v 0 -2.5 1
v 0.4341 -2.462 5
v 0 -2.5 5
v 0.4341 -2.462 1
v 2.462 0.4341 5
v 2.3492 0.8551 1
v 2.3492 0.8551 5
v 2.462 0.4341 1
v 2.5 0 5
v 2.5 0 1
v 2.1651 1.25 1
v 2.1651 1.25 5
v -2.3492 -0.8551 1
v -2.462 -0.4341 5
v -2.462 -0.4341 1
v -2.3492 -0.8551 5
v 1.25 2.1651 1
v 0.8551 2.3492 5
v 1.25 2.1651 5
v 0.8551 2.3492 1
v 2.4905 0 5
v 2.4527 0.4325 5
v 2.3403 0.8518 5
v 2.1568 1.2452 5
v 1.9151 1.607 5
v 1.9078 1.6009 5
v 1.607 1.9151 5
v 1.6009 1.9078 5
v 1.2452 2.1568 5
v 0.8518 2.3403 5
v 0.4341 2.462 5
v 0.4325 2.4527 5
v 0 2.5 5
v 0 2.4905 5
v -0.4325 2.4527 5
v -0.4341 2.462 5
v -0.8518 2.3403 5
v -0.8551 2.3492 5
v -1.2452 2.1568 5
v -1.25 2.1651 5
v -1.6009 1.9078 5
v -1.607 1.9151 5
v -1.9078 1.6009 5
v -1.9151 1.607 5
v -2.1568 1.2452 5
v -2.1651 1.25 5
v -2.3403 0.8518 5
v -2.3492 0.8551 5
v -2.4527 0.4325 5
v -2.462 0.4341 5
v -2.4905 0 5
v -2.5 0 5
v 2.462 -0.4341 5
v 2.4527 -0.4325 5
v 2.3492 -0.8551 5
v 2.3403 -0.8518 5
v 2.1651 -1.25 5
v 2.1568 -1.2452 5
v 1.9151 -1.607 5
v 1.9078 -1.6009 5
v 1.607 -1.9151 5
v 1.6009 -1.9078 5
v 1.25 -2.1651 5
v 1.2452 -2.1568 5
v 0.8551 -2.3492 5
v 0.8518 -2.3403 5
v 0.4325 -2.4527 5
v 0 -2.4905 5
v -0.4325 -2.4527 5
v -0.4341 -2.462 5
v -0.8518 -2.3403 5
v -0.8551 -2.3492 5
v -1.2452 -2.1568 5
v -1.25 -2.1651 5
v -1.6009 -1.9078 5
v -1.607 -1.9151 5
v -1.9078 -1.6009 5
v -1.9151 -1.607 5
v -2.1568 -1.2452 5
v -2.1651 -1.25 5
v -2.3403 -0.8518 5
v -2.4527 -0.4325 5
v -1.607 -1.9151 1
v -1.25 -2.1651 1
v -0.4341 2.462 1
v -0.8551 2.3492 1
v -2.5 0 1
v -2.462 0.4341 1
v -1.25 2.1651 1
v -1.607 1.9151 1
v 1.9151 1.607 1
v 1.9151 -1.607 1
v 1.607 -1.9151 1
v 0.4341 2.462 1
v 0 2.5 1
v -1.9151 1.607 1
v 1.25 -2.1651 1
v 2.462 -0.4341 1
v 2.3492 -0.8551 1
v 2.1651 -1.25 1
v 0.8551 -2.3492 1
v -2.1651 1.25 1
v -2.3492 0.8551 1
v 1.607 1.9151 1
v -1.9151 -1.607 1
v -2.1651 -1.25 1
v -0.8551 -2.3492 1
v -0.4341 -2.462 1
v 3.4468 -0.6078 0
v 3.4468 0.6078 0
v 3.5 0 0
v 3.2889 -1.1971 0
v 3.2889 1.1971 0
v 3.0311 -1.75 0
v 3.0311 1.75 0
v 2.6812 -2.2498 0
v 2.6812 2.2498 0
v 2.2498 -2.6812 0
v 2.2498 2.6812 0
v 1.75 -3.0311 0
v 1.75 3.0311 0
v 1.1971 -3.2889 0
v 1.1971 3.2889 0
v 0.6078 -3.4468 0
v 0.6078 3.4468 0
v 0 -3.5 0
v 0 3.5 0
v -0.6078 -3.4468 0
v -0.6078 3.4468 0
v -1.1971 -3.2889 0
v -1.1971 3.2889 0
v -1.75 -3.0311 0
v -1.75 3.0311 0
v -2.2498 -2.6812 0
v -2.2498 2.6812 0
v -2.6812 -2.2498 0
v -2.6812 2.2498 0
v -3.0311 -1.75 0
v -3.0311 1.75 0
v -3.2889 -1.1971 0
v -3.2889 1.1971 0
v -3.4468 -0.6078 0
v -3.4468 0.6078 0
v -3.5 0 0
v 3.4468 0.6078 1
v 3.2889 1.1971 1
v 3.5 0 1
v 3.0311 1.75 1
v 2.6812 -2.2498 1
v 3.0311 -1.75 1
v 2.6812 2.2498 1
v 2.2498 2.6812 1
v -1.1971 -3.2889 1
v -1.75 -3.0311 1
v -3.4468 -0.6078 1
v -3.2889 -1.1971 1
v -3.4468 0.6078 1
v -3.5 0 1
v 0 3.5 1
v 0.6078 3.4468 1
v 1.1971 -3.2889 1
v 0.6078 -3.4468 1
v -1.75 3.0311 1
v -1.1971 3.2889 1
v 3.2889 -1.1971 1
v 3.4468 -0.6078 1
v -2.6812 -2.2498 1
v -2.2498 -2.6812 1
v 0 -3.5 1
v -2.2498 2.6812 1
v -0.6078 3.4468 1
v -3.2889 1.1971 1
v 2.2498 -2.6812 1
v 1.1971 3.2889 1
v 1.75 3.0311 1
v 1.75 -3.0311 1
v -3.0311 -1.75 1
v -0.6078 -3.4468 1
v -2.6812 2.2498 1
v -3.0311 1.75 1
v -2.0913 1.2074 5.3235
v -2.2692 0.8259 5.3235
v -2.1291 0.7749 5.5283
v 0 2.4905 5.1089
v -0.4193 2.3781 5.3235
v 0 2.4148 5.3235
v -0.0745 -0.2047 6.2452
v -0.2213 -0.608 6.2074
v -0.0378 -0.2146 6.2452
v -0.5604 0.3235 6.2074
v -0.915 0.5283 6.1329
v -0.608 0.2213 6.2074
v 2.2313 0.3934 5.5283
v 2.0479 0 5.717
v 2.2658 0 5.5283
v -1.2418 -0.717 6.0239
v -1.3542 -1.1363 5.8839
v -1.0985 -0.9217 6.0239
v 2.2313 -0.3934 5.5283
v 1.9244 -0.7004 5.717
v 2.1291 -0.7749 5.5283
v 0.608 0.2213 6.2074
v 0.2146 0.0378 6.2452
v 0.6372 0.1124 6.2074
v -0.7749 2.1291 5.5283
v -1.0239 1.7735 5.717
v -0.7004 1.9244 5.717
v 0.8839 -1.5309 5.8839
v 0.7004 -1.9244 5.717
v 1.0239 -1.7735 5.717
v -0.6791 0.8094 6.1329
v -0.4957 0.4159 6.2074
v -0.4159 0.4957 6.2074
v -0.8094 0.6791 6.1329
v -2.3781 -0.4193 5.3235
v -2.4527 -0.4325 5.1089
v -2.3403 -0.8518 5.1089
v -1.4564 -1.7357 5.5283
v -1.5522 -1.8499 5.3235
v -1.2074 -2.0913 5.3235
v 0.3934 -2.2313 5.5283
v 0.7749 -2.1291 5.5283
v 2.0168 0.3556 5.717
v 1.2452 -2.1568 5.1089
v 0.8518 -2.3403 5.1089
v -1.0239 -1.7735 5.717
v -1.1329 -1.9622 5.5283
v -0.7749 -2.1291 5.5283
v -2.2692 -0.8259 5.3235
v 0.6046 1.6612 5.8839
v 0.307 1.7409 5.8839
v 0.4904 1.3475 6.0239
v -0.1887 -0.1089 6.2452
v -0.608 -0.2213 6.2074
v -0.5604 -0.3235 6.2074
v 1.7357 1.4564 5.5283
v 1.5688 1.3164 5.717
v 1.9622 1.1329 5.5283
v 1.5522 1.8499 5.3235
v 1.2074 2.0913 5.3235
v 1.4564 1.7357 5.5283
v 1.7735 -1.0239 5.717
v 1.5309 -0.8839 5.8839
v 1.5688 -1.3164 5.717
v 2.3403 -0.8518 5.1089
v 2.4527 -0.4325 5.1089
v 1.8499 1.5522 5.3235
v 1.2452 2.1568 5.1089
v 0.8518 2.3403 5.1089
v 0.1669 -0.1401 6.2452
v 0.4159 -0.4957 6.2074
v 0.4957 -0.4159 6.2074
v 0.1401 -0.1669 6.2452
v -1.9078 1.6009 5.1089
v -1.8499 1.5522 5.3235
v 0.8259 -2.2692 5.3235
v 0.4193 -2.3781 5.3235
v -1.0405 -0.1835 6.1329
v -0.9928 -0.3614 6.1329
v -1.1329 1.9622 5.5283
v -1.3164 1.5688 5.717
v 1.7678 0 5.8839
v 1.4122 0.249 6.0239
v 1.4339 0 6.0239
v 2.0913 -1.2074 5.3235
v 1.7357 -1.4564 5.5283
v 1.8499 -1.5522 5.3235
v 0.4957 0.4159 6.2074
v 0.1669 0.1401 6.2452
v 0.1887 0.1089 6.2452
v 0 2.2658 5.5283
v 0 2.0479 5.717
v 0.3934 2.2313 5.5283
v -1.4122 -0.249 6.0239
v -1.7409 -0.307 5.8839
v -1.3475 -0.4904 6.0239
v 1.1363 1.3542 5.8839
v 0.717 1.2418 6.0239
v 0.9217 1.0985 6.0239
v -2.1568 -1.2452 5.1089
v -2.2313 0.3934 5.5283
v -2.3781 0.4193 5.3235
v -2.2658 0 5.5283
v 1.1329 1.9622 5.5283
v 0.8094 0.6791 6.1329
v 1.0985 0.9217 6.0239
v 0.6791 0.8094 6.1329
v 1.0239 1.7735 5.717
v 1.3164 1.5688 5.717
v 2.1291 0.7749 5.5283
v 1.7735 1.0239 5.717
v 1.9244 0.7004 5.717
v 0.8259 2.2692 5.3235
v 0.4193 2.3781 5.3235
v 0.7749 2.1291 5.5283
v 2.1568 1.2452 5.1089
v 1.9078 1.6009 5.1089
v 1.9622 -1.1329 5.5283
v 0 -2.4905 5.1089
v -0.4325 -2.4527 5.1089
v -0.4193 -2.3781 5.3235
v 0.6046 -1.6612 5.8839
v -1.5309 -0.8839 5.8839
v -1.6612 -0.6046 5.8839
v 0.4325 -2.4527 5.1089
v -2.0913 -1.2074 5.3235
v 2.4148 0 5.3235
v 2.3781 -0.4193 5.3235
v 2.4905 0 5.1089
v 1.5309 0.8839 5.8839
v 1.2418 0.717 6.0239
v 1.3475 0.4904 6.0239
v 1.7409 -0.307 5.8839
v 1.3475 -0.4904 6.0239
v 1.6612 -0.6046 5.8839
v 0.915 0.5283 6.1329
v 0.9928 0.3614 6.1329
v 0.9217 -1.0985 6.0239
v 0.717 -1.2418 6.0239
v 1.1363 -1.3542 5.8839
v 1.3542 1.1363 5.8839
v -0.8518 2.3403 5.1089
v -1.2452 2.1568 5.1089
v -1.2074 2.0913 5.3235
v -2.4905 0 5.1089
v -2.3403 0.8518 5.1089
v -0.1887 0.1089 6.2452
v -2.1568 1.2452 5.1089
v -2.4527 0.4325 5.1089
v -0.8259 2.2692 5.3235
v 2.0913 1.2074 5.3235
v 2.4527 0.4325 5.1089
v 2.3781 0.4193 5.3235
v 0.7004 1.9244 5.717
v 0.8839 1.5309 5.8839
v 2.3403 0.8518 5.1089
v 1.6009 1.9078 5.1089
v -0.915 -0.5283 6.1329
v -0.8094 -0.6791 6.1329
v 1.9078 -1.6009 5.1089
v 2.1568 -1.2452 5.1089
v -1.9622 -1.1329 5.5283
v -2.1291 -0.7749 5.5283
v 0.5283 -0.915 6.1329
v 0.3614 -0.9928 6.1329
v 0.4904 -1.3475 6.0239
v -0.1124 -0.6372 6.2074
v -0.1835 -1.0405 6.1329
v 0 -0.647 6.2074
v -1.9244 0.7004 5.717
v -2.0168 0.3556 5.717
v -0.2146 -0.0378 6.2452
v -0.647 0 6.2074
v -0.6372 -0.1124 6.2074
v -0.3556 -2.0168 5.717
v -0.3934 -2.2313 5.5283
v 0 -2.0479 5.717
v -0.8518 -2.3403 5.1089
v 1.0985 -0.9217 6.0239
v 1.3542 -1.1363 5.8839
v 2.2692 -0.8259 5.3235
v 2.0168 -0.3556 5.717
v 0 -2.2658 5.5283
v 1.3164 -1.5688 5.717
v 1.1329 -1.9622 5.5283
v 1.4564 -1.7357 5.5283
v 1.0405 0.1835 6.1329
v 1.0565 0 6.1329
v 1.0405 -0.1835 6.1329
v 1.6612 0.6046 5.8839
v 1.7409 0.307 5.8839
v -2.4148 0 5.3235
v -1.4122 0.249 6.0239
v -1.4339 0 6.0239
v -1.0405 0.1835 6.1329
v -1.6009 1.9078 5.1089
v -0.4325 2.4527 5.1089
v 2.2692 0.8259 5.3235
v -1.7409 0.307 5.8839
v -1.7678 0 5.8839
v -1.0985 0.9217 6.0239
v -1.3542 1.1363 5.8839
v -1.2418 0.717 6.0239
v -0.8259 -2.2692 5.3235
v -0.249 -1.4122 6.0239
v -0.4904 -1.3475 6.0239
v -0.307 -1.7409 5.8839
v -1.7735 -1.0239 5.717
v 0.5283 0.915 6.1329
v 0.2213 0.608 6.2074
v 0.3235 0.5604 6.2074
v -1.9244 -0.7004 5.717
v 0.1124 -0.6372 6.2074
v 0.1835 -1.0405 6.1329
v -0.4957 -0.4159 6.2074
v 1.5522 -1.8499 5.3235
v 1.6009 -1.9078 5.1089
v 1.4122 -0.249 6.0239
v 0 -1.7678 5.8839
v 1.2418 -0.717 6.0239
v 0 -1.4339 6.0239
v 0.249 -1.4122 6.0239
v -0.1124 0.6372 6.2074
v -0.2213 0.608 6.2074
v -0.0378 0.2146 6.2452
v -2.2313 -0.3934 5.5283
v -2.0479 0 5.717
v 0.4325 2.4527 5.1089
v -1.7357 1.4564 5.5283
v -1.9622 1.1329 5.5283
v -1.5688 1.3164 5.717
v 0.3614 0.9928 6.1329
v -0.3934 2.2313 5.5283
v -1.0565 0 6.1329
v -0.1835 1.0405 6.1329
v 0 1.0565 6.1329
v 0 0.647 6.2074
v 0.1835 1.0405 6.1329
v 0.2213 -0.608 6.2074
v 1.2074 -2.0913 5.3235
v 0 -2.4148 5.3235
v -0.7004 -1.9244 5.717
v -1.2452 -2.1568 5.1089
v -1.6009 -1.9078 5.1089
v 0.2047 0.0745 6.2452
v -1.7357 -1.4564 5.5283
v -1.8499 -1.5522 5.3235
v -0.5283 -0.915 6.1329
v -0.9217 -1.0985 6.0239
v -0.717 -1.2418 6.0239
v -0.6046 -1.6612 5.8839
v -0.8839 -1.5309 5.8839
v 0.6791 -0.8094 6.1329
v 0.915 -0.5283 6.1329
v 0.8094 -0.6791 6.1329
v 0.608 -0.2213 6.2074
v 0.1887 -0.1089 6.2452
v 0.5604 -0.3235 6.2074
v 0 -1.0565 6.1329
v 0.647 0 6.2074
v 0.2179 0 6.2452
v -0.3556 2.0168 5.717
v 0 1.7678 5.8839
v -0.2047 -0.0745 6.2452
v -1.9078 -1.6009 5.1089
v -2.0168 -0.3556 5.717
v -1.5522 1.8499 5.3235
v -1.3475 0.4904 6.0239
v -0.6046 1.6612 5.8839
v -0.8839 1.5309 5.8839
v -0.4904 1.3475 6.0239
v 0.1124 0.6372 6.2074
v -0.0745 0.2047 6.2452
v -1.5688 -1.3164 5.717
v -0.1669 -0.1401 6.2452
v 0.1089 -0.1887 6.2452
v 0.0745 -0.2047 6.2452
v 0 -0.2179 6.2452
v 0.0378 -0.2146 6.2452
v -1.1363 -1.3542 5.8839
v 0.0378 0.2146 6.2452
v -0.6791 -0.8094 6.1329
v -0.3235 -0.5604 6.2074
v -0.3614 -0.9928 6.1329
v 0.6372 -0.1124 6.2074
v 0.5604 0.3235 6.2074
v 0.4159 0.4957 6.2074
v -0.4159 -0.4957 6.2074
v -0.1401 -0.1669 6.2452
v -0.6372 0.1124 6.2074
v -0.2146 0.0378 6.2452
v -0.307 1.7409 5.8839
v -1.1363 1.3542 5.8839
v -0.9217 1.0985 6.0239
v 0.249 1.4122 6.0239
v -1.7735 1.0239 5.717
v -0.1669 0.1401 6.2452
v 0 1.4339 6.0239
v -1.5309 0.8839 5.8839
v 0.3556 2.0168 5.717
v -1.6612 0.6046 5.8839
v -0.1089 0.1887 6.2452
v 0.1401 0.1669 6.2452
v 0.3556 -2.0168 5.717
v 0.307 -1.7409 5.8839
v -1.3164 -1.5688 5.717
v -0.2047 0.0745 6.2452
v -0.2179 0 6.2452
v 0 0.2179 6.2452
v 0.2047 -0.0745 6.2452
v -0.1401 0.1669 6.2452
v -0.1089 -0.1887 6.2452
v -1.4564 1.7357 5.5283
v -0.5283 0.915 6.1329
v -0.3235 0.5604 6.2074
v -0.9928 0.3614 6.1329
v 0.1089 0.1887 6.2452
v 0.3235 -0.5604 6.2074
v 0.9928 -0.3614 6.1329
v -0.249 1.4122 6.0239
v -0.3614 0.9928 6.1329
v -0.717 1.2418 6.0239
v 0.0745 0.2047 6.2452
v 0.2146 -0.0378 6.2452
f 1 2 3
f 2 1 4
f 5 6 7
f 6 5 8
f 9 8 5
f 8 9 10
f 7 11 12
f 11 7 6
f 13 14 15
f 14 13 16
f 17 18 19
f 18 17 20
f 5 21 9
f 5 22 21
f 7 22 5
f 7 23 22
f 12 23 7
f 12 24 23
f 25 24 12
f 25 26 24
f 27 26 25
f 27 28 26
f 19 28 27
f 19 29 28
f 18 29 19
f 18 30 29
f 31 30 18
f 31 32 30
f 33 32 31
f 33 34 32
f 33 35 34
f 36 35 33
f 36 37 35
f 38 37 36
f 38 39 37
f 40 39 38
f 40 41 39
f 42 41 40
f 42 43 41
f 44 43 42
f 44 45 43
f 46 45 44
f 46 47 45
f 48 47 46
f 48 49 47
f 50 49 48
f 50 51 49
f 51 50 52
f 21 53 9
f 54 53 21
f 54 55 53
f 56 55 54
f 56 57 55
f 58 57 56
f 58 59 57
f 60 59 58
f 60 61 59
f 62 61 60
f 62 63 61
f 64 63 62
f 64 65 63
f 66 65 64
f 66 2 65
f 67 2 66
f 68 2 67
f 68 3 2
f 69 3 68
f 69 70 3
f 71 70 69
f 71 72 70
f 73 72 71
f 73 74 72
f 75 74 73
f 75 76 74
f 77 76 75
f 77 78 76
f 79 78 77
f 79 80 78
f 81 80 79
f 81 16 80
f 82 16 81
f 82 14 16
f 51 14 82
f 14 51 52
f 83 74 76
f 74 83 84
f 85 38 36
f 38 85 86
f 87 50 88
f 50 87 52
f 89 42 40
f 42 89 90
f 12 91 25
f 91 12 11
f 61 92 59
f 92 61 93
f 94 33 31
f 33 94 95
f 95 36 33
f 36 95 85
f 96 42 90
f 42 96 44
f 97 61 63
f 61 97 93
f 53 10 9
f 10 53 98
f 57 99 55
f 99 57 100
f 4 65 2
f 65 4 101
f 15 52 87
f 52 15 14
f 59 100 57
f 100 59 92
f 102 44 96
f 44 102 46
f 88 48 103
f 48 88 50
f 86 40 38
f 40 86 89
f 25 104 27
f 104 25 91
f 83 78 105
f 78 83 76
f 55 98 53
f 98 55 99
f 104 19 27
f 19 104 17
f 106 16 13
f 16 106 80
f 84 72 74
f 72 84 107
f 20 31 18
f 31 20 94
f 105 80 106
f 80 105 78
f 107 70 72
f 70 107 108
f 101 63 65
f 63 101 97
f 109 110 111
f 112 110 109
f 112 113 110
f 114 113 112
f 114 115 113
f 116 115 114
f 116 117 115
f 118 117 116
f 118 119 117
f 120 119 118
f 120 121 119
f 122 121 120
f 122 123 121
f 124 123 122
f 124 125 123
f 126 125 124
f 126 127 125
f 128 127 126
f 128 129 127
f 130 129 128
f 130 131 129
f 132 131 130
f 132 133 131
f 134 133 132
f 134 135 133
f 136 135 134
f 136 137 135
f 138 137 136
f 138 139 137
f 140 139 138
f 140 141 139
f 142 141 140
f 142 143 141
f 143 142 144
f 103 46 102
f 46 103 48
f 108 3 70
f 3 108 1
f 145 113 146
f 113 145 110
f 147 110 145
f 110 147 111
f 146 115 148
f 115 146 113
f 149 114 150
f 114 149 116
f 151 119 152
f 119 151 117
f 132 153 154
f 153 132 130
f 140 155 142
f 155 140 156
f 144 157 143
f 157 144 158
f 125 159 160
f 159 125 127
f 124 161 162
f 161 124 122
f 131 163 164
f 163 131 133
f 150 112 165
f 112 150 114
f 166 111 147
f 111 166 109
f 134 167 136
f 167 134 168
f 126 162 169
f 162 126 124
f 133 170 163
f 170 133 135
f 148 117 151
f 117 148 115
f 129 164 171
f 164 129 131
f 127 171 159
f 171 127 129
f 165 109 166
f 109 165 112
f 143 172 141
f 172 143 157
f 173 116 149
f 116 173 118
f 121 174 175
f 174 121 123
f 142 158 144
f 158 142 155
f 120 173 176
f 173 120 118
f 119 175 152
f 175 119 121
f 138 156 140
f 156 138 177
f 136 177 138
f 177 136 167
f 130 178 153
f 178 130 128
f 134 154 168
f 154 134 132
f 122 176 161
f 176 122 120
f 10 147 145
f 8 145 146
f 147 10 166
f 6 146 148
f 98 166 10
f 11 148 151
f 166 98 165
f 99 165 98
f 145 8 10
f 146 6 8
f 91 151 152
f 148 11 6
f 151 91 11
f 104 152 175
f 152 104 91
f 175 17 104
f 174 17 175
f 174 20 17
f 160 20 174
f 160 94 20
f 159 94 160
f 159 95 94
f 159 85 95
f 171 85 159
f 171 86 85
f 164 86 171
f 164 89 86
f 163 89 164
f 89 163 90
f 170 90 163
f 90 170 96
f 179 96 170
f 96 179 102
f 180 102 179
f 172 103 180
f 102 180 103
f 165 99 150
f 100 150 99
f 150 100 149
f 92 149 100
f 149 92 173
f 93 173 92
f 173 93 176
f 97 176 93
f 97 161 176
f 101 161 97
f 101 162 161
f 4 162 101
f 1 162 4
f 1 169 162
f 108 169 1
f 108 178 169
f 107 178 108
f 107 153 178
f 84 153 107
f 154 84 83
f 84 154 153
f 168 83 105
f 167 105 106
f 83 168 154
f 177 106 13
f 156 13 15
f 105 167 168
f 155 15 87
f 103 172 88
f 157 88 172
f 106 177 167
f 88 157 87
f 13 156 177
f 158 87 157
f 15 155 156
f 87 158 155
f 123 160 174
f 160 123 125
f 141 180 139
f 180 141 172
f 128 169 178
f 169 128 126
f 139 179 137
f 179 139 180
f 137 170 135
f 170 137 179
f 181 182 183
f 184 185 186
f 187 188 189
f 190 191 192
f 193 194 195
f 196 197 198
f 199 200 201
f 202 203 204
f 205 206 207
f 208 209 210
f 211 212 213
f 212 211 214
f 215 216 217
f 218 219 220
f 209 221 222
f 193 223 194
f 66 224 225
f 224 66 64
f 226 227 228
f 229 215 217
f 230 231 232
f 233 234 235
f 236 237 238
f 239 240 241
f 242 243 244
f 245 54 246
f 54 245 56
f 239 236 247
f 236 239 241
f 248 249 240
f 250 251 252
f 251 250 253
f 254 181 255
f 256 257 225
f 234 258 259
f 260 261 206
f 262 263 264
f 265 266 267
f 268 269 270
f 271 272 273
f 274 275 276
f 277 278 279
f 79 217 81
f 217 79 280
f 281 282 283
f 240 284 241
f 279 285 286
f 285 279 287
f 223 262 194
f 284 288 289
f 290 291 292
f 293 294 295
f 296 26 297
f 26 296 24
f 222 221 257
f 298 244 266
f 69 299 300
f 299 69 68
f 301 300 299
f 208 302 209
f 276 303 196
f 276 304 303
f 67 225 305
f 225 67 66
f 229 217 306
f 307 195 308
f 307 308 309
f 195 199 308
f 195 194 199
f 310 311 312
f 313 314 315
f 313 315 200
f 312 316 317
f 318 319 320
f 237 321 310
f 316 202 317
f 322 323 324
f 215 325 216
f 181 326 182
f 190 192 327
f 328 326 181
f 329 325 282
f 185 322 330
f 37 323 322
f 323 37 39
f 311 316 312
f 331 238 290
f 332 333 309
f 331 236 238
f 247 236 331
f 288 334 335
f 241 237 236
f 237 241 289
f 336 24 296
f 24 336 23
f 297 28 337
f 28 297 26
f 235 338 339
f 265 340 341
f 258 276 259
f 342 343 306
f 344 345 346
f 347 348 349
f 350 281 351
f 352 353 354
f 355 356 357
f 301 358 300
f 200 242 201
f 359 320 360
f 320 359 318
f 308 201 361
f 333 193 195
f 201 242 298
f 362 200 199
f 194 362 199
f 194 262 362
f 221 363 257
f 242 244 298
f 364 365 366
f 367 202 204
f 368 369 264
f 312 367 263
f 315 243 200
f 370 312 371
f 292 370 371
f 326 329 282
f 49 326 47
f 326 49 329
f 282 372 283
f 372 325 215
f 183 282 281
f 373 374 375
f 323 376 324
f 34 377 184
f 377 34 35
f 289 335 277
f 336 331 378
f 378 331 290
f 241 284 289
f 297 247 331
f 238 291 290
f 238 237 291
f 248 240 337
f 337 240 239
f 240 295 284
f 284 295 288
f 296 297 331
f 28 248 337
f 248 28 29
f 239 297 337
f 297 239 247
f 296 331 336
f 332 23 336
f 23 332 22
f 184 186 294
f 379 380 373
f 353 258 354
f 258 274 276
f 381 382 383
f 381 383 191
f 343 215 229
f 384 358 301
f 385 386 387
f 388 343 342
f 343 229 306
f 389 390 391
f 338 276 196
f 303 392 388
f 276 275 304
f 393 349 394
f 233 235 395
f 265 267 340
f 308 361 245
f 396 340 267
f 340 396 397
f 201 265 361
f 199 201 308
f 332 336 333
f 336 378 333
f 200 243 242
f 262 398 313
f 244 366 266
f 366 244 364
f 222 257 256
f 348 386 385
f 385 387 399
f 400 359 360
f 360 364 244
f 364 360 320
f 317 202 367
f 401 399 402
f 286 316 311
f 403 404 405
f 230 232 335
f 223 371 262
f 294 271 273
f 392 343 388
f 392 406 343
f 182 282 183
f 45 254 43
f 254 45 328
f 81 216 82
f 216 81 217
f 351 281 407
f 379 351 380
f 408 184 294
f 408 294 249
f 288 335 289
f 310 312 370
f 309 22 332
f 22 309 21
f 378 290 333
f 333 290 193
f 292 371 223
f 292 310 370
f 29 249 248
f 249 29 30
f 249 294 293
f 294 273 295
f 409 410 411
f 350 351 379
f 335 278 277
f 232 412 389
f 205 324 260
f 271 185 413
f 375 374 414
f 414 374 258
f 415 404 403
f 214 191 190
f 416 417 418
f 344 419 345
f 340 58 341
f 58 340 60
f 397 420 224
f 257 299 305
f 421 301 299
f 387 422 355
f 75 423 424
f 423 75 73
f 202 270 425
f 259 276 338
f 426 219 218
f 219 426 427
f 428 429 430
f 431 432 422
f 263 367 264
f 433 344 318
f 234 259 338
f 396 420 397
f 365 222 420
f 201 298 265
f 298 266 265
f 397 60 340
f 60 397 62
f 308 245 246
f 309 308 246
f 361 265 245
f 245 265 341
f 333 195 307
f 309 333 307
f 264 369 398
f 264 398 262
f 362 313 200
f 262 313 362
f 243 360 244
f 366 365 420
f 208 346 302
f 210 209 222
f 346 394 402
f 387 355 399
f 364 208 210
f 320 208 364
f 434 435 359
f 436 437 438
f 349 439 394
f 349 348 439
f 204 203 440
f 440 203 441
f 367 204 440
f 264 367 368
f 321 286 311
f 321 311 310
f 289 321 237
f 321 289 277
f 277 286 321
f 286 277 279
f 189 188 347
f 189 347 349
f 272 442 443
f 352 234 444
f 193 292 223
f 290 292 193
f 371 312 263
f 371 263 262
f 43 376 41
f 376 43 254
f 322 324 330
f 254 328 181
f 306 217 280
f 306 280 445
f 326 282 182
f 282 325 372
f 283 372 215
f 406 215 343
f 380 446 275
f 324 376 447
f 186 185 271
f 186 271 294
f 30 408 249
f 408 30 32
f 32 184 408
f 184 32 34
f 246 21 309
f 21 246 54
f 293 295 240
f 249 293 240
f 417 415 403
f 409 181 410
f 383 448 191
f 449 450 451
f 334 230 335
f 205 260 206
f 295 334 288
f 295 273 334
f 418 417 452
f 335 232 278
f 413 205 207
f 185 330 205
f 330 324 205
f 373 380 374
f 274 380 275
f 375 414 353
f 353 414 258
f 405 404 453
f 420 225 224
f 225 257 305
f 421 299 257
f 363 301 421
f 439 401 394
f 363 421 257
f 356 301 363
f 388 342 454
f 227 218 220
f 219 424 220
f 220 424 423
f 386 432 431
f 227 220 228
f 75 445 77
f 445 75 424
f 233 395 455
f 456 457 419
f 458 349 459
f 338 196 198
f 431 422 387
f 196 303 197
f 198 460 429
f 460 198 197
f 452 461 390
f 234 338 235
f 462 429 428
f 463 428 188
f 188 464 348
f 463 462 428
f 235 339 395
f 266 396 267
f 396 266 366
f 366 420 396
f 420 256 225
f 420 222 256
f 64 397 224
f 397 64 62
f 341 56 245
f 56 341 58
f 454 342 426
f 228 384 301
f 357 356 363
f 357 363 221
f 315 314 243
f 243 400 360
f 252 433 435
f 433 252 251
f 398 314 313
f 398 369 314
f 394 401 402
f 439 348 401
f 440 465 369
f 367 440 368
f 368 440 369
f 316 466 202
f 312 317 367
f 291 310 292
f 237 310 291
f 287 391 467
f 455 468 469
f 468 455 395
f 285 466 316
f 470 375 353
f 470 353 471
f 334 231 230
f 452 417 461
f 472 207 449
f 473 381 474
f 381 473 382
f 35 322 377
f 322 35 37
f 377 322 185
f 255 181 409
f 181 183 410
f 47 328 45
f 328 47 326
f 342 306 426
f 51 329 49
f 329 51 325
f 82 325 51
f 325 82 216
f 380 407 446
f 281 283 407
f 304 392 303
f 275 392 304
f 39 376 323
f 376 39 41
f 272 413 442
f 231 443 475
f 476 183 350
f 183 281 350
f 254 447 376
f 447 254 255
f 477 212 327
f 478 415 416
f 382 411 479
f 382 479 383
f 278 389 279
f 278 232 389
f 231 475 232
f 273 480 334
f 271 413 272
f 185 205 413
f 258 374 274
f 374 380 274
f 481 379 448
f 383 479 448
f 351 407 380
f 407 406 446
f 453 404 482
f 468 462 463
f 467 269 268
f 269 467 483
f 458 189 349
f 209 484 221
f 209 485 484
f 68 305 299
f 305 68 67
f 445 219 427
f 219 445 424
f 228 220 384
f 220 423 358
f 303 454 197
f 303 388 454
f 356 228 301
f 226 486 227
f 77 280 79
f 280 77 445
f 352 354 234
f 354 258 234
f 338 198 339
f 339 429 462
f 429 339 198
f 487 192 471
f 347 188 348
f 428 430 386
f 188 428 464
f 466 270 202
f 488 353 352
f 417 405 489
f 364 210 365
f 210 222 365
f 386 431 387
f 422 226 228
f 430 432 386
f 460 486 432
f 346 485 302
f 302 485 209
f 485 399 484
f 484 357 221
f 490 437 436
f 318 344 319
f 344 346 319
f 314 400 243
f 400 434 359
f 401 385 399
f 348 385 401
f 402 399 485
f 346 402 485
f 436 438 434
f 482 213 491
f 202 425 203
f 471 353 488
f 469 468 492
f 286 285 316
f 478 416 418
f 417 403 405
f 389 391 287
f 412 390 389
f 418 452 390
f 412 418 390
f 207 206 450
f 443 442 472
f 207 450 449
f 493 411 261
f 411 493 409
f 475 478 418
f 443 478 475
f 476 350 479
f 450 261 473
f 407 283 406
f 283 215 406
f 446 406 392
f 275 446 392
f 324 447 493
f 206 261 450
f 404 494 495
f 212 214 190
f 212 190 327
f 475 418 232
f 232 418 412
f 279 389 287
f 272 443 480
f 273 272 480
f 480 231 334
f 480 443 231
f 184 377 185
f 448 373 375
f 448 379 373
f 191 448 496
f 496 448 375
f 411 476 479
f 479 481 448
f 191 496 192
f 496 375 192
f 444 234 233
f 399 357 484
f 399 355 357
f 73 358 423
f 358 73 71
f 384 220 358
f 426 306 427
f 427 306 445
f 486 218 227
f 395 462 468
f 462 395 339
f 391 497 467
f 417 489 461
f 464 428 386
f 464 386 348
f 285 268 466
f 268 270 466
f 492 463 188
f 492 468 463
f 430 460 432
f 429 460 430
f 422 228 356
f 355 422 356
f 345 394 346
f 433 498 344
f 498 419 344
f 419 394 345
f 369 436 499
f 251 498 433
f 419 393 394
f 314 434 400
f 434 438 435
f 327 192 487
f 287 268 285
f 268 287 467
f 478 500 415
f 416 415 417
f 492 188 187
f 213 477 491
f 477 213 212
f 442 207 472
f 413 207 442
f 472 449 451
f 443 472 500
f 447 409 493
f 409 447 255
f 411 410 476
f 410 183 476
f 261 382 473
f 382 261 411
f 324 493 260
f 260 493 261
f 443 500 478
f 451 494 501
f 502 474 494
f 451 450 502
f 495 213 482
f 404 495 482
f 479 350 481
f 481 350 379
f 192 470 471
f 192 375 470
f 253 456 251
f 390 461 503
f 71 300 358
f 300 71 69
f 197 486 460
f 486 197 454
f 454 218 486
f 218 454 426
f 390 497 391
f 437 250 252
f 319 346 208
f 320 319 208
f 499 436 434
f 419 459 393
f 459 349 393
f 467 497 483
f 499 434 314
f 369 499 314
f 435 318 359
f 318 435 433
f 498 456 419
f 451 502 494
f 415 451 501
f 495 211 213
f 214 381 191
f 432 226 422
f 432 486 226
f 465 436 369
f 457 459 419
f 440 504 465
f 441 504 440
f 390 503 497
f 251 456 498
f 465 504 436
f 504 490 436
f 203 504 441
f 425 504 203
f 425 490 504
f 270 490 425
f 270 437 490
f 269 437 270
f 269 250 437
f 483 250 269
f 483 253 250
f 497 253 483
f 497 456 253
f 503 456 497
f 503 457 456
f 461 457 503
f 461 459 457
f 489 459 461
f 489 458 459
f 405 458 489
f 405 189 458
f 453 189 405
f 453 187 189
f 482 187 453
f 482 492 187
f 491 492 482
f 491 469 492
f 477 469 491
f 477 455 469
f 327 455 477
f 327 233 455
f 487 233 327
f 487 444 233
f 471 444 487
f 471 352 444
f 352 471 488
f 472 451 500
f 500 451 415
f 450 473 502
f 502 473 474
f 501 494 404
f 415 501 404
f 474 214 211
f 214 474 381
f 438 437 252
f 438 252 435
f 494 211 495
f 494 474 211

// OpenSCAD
$fn=36;

union(){
 cylinder(h=5, d=5, center=false);
 cylinder(h=1, d=7, center=false);
 translate([0,0,5])
    scale([1,1,0.5]) 
     sphere(d=5);
}
